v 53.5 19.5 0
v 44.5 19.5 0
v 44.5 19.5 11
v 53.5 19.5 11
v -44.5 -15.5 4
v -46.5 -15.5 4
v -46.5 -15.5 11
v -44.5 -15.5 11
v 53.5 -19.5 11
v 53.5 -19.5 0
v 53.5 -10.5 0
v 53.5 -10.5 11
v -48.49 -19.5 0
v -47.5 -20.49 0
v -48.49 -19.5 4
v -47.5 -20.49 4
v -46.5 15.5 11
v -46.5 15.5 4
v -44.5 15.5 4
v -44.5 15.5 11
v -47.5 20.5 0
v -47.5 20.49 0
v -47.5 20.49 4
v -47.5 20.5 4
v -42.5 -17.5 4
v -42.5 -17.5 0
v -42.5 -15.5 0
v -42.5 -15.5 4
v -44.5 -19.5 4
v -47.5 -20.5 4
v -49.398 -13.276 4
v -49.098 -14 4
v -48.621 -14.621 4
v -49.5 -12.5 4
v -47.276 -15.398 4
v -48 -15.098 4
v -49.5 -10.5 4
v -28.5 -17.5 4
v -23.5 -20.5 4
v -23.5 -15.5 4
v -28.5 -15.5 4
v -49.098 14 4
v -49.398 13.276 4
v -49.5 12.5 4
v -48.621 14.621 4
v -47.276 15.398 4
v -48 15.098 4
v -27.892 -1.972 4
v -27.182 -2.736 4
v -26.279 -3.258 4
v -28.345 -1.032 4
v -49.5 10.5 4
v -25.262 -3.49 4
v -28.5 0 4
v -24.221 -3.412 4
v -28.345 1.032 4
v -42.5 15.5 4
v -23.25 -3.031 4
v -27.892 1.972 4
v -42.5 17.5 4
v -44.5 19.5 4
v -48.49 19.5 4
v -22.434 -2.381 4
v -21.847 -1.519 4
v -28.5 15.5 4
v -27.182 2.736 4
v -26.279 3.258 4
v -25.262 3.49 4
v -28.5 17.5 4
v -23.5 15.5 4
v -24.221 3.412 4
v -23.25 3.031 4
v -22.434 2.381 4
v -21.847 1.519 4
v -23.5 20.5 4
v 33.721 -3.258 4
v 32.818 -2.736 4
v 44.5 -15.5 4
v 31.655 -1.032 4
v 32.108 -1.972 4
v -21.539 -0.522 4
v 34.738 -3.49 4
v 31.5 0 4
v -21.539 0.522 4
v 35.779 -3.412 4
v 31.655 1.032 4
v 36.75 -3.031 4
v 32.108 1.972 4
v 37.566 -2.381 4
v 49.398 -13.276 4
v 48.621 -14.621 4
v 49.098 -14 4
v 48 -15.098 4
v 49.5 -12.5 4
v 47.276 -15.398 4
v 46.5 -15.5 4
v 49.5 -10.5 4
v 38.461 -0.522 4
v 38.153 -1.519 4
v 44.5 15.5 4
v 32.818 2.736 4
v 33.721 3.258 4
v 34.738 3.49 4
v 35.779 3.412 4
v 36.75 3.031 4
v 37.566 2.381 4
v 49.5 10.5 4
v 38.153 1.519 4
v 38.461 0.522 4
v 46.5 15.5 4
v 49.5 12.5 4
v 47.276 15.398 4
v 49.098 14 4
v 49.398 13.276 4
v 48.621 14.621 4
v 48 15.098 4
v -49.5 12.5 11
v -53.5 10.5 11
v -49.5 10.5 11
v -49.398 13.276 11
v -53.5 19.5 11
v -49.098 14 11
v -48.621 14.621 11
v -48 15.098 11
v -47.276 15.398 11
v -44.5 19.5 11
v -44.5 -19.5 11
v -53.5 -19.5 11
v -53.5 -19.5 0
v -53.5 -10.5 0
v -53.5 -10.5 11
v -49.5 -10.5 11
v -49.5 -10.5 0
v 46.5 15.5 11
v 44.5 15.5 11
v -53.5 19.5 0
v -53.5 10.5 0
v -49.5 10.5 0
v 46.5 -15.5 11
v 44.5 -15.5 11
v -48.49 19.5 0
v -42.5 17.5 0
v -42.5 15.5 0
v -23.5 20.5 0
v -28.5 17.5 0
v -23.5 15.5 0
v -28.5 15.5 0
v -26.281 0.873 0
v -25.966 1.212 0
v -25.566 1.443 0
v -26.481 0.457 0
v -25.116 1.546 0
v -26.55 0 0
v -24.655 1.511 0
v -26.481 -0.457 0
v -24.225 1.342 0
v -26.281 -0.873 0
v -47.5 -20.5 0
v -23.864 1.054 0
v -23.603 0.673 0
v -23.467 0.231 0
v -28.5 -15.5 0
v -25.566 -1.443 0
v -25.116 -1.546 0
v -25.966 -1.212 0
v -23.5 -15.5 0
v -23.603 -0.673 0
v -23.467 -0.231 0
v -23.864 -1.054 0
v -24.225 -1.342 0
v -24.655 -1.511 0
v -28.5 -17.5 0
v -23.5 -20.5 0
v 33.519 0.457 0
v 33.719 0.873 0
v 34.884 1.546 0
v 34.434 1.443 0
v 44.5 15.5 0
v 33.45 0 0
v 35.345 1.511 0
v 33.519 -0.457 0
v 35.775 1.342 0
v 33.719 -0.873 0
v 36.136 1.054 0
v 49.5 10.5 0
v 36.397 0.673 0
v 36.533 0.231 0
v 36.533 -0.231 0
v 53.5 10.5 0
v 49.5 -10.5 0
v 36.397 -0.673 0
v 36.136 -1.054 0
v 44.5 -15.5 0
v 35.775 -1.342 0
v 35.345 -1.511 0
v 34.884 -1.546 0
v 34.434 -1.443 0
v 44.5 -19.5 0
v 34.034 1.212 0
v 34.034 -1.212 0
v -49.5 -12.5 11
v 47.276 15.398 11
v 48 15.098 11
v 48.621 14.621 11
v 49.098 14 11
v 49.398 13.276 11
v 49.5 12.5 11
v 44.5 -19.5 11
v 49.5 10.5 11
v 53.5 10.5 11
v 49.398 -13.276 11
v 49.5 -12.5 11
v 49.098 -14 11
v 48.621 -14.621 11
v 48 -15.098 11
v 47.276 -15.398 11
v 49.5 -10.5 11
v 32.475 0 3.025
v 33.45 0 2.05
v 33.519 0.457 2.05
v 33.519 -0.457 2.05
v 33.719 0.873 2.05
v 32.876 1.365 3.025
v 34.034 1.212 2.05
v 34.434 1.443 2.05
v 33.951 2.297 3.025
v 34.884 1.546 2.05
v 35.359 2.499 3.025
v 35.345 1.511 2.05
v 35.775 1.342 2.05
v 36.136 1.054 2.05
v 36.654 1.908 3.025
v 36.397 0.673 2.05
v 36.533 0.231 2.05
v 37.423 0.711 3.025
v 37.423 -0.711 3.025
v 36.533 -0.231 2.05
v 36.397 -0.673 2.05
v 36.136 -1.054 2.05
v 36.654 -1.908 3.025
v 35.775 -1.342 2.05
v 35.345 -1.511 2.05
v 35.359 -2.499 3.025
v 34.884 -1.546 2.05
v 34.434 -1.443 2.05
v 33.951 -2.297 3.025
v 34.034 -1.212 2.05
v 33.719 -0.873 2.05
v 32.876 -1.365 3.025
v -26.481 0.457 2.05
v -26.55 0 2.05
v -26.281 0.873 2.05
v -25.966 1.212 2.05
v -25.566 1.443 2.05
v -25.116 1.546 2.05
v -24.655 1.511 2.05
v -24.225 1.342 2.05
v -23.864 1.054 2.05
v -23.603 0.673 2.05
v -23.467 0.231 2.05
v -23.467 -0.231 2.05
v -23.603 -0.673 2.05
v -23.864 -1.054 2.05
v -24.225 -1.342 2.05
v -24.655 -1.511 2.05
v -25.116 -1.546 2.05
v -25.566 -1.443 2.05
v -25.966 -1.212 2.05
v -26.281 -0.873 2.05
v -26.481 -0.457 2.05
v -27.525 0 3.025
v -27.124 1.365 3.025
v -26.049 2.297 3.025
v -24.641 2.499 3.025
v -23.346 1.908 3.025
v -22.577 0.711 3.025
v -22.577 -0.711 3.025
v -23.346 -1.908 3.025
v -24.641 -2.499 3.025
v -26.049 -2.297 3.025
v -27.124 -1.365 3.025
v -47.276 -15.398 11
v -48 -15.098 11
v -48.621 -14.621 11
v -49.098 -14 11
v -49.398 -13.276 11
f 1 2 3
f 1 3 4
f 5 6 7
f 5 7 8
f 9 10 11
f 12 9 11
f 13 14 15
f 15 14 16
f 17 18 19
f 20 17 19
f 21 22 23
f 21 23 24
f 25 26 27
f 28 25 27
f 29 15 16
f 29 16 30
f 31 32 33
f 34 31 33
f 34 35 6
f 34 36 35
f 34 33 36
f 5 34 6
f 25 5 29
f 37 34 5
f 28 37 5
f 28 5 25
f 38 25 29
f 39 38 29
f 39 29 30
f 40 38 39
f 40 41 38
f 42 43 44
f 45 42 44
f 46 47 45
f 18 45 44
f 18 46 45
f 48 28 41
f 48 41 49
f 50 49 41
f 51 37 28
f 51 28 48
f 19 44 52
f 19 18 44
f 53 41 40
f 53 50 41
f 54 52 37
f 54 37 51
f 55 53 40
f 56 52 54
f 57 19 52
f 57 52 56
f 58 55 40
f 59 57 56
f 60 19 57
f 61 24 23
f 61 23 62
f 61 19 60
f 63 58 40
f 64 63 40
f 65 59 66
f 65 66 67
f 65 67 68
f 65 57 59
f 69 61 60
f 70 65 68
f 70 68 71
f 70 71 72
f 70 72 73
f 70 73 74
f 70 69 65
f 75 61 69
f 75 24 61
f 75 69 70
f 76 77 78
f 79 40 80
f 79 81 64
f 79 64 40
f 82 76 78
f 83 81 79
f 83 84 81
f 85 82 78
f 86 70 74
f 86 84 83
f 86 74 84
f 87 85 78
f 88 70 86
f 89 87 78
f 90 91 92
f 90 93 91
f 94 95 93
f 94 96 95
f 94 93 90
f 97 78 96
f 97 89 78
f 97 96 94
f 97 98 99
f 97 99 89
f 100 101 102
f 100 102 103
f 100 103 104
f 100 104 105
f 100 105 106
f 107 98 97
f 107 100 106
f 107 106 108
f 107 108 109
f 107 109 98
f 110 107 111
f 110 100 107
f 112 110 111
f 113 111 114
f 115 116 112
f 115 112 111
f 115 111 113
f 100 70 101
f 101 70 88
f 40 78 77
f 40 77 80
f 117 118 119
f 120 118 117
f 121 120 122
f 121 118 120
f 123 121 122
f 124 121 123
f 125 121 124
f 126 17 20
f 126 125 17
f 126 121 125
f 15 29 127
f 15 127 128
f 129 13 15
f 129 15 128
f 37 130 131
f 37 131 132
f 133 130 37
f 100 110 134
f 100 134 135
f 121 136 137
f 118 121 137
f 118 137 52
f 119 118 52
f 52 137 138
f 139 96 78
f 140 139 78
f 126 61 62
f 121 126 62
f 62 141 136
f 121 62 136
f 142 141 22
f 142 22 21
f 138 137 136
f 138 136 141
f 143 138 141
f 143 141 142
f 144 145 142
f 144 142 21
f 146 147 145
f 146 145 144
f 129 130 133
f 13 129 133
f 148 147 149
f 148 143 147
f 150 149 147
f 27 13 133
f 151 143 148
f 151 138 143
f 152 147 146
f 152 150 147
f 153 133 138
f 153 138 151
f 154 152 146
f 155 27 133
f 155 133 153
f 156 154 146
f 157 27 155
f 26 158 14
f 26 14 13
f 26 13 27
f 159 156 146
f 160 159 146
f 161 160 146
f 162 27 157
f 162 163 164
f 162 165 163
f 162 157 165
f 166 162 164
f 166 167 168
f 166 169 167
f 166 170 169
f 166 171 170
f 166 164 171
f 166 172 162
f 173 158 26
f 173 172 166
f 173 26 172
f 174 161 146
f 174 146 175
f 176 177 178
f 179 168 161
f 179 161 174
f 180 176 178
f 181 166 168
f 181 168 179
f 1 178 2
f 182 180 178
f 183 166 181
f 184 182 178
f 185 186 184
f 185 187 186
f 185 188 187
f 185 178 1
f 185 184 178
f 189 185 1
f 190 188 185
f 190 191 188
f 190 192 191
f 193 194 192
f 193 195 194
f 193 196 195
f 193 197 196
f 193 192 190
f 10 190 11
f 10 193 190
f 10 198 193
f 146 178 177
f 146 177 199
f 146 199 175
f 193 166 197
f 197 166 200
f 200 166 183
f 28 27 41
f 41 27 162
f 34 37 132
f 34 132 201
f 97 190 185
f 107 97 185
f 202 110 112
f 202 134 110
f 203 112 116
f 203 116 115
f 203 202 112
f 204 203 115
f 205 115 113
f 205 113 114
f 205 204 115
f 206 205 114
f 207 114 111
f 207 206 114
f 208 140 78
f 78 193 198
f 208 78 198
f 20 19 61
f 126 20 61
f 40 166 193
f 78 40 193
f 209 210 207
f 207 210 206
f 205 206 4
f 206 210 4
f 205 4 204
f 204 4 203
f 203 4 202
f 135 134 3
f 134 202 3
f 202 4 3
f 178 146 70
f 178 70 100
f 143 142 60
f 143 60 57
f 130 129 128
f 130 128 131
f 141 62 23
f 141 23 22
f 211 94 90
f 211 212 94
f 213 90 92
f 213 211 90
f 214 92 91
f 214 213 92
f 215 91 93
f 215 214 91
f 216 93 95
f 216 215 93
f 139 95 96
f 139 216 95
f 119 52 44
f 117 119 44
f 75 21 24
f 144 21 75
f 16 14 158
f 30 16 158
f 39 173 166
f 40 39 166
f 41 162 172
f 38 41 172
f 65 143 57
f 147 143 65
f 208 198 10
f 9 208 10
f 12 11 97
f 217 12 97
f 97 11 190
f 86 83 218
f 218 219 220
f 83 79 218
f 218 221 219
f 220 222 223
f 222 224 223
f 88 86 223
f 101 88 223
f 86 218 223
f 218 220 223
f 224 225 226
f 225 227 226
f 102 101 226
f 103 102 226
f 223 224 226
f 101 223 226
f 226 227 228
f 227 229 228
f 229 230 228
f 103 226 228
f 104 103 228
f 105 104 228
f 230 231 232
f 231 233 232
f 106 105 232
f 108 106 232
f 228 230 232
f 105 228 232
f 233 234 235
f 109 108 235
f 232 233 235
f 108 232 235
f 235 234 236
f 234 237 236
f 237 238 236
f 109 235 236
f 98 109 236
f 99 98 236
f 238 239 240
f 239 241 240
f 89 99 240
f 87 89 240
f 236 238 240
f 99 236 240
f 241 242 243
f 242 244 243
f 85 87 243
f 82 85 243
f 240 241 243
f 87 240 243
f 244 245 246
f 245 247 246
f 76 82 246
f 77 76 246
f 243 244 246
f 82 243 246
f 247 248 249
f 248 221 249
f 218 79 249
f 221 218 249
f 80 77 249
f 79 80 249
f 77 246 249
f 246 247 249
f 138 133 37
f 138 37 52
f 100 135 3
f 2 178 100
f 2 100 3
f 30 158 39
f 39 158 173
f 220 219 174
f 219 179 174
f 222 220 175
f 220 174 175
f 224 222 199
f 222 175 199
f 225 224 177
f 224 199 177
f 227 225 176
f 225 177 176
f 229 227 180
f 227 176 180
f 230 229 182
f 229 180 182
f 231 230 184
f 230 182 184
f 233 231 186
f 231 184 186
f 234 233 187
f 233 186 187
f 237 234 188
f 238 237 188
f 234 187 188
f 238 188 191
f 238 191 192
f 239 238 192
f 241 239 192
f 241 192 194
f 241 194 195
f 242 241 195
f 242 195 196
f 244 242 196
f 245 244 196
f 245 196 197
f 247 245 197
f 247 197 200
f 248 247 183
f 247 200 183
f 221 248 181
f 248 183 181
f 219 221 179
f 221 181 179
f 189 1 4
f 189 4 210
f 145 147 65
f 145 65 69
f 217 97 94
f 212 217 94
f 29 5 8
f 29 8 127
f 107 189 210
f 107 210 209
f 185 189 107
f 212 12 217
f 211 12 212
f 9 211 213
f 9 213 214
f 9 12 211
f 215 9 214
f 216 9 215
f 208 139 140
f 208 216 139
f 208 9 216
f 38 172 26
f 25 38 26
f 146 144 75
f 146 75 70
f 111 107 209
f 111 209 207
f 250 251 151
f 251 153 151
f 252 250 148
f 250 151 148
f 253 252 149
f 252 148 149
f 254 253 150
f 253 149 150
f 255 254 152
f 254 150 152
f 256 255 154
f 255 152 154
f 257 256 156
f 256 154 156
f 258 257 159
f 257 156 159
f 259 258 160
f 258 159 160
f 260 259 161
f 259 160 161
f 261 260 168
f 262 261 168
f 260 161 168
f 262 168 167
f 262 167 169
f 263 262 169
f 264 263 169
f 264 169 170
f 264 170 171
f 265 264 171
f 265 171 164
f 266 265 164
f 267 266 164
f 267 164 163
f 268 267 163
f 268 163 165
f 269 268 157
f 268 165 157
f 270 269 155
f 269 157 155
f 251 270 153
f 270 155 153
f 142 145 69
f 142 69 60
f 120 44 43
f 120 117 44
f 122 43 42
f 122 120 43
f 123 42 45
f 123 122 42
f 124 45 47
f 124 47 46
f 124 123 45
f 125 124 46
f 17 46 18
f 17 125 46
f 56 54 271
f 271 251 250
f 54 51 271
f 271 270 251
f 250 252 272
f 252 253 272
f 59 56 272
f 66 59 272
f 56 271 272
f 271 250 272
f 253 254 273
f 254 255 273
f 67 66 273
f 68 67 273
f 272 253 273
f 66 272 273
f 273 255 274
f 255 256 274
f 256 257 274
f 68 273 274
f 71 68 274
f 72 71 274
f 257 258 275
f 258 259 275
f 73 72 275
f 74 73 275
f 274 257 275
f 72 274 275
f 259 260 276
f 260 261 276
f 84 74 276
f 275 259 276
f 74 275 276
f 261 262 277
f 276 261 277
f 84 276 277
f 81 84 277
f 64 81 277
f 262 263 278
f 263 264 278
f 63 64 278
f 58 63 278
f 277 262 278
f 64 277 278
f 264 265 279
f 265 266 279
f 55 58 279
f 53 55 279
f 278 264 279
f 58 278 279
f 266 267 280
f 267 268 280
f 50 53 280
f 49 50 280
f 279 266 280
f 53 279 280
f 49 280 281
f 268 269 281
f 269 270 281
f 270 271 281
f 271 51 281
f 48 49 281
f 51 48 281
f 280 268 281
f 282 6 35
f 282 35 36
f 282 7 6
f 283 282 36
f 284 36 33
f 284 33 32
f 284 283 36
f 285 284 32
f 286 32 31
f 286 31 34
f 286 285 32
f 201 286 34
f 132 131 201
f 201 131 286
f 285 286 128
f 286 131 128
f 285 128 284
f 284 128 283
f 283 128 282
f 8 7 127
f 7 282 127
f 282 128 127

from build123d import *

# Parameters (mm, degrees)
SKETCH_W                = 99
SKETCH_H                = 31
PAD_DEPTH               = 4
PAD001_DEPTH            = 11
PAD002_DEPTH            = 4
PAD001_MIRRORED_2_DEPTH = 11
POLARPATTERN_COUNT      = 2
CHAMFER_SIZE            = 0.99
FILLET_R                = 3
HOLE_D                  = 3.1
HOLE_DEPTH              = 25
HOLE_CSINK_D            = 7
HOLE_CSINK_ANGLE        = 90


with BuildPart() as part:
    # Sketch → Pad (new body)
    with BuildSketch(Plane.XY):
        Rectangle(SKETCH_W, SKETCH_H)
    extrude(amount=PAD_DEPTH)

    # Sketch001 → Pad001 (join)
    with BuildSketch(Plane.XY):
        Polygon((-49.5, 15.5), (-44.5, 15.5), (-44.5, 19.5), (-53.5, 19.5), (-53.5, 10.5), (-49.5, 10.5), align=None)
    pad001 = extrude(amount=PAD001_DEPTH)

    # Sketch002 → Pad002 (join)
    with BuildSketch(Plane.XY):
        Polygon((-47.5, 15.5), (-47.5, 20.5), (-23.5, 20.5), (-23.5, 15.5), (-28.5, 15.5), (-28.5, 17.5), (-42.5, 17.5), (-42.5, 15.5), align=None)
    pad002 = extrude(amount=PAD002_DEPTH)

    # Sketch001 Mirrored 2 → Pad001 Mirrored 2 (add)
    with BuildSketch(Plane(origin=(0, 0, 0), x_dir=(-1, 0, 0), z_dir=(0, 0, -1))):
        Polygon((-49.5, 15.5), (-44.5, 15.5), (-44.5, 19.5), (-53.5, 19.5), (-53.5, 10.5), (-49.5, 10.5), align=None)
    pad001_mirrored_2 = extrude(amount=-PAD001_MIRRORED_2_DEPTH)

    # PolarPattern: Pad001, Pad001 Mirrored 2 ×2 about axis
    polarpattern_axis = Axis((0, 0, 0), (0, 0, 1))
    for i in range(1, POLARPATTERN_COUNT):
        add(pad001.rotate(polarpattern_axis, i * 360 / POLARPATTERN_COUNT))
        add(pad001_mirrored_2.rotate(polarpattern_axis, i * 360 / POLARPATTERN_COUNT))

    # Mirrored001: Pad002 across Sketch002 H_Axis
    add(pad002.mirror(Plane.ZX))

    # Chamfer
    chamfer_edges = [part.edges().sort_by_distance(p)[0] for p in [
        (-47.5, -19.5, 2),
        (-47.5, 19.5, 2),
    ]]
    chamfer(chamfer_edges, length=CHAMFER_SIZE)

    # Fillet
    fillet_edges = [part.edges().sort_by_distance(p)[0] for p in [
        (-49.5, -15.5, 7.5),
        (-49.5, 15.5, 7.5),
        (49.5, 15.5, 7.5),
        (49.5, -15.5, 7.5),
    ]]
    fillet(fillet_edges, radius=FILLET_R)

    # Hole
    with Locations(Plane.XY.offset(4)):
        with Locations((-25, 0), (35, 0)):
            CounterSinkHole(HOLE_D / 2, HOLE_CSINK_D / 2, depth=HOLE_DEPTH, counter_sink_angle=HOLE_CSINK_ANGLE)


solid = part.part
